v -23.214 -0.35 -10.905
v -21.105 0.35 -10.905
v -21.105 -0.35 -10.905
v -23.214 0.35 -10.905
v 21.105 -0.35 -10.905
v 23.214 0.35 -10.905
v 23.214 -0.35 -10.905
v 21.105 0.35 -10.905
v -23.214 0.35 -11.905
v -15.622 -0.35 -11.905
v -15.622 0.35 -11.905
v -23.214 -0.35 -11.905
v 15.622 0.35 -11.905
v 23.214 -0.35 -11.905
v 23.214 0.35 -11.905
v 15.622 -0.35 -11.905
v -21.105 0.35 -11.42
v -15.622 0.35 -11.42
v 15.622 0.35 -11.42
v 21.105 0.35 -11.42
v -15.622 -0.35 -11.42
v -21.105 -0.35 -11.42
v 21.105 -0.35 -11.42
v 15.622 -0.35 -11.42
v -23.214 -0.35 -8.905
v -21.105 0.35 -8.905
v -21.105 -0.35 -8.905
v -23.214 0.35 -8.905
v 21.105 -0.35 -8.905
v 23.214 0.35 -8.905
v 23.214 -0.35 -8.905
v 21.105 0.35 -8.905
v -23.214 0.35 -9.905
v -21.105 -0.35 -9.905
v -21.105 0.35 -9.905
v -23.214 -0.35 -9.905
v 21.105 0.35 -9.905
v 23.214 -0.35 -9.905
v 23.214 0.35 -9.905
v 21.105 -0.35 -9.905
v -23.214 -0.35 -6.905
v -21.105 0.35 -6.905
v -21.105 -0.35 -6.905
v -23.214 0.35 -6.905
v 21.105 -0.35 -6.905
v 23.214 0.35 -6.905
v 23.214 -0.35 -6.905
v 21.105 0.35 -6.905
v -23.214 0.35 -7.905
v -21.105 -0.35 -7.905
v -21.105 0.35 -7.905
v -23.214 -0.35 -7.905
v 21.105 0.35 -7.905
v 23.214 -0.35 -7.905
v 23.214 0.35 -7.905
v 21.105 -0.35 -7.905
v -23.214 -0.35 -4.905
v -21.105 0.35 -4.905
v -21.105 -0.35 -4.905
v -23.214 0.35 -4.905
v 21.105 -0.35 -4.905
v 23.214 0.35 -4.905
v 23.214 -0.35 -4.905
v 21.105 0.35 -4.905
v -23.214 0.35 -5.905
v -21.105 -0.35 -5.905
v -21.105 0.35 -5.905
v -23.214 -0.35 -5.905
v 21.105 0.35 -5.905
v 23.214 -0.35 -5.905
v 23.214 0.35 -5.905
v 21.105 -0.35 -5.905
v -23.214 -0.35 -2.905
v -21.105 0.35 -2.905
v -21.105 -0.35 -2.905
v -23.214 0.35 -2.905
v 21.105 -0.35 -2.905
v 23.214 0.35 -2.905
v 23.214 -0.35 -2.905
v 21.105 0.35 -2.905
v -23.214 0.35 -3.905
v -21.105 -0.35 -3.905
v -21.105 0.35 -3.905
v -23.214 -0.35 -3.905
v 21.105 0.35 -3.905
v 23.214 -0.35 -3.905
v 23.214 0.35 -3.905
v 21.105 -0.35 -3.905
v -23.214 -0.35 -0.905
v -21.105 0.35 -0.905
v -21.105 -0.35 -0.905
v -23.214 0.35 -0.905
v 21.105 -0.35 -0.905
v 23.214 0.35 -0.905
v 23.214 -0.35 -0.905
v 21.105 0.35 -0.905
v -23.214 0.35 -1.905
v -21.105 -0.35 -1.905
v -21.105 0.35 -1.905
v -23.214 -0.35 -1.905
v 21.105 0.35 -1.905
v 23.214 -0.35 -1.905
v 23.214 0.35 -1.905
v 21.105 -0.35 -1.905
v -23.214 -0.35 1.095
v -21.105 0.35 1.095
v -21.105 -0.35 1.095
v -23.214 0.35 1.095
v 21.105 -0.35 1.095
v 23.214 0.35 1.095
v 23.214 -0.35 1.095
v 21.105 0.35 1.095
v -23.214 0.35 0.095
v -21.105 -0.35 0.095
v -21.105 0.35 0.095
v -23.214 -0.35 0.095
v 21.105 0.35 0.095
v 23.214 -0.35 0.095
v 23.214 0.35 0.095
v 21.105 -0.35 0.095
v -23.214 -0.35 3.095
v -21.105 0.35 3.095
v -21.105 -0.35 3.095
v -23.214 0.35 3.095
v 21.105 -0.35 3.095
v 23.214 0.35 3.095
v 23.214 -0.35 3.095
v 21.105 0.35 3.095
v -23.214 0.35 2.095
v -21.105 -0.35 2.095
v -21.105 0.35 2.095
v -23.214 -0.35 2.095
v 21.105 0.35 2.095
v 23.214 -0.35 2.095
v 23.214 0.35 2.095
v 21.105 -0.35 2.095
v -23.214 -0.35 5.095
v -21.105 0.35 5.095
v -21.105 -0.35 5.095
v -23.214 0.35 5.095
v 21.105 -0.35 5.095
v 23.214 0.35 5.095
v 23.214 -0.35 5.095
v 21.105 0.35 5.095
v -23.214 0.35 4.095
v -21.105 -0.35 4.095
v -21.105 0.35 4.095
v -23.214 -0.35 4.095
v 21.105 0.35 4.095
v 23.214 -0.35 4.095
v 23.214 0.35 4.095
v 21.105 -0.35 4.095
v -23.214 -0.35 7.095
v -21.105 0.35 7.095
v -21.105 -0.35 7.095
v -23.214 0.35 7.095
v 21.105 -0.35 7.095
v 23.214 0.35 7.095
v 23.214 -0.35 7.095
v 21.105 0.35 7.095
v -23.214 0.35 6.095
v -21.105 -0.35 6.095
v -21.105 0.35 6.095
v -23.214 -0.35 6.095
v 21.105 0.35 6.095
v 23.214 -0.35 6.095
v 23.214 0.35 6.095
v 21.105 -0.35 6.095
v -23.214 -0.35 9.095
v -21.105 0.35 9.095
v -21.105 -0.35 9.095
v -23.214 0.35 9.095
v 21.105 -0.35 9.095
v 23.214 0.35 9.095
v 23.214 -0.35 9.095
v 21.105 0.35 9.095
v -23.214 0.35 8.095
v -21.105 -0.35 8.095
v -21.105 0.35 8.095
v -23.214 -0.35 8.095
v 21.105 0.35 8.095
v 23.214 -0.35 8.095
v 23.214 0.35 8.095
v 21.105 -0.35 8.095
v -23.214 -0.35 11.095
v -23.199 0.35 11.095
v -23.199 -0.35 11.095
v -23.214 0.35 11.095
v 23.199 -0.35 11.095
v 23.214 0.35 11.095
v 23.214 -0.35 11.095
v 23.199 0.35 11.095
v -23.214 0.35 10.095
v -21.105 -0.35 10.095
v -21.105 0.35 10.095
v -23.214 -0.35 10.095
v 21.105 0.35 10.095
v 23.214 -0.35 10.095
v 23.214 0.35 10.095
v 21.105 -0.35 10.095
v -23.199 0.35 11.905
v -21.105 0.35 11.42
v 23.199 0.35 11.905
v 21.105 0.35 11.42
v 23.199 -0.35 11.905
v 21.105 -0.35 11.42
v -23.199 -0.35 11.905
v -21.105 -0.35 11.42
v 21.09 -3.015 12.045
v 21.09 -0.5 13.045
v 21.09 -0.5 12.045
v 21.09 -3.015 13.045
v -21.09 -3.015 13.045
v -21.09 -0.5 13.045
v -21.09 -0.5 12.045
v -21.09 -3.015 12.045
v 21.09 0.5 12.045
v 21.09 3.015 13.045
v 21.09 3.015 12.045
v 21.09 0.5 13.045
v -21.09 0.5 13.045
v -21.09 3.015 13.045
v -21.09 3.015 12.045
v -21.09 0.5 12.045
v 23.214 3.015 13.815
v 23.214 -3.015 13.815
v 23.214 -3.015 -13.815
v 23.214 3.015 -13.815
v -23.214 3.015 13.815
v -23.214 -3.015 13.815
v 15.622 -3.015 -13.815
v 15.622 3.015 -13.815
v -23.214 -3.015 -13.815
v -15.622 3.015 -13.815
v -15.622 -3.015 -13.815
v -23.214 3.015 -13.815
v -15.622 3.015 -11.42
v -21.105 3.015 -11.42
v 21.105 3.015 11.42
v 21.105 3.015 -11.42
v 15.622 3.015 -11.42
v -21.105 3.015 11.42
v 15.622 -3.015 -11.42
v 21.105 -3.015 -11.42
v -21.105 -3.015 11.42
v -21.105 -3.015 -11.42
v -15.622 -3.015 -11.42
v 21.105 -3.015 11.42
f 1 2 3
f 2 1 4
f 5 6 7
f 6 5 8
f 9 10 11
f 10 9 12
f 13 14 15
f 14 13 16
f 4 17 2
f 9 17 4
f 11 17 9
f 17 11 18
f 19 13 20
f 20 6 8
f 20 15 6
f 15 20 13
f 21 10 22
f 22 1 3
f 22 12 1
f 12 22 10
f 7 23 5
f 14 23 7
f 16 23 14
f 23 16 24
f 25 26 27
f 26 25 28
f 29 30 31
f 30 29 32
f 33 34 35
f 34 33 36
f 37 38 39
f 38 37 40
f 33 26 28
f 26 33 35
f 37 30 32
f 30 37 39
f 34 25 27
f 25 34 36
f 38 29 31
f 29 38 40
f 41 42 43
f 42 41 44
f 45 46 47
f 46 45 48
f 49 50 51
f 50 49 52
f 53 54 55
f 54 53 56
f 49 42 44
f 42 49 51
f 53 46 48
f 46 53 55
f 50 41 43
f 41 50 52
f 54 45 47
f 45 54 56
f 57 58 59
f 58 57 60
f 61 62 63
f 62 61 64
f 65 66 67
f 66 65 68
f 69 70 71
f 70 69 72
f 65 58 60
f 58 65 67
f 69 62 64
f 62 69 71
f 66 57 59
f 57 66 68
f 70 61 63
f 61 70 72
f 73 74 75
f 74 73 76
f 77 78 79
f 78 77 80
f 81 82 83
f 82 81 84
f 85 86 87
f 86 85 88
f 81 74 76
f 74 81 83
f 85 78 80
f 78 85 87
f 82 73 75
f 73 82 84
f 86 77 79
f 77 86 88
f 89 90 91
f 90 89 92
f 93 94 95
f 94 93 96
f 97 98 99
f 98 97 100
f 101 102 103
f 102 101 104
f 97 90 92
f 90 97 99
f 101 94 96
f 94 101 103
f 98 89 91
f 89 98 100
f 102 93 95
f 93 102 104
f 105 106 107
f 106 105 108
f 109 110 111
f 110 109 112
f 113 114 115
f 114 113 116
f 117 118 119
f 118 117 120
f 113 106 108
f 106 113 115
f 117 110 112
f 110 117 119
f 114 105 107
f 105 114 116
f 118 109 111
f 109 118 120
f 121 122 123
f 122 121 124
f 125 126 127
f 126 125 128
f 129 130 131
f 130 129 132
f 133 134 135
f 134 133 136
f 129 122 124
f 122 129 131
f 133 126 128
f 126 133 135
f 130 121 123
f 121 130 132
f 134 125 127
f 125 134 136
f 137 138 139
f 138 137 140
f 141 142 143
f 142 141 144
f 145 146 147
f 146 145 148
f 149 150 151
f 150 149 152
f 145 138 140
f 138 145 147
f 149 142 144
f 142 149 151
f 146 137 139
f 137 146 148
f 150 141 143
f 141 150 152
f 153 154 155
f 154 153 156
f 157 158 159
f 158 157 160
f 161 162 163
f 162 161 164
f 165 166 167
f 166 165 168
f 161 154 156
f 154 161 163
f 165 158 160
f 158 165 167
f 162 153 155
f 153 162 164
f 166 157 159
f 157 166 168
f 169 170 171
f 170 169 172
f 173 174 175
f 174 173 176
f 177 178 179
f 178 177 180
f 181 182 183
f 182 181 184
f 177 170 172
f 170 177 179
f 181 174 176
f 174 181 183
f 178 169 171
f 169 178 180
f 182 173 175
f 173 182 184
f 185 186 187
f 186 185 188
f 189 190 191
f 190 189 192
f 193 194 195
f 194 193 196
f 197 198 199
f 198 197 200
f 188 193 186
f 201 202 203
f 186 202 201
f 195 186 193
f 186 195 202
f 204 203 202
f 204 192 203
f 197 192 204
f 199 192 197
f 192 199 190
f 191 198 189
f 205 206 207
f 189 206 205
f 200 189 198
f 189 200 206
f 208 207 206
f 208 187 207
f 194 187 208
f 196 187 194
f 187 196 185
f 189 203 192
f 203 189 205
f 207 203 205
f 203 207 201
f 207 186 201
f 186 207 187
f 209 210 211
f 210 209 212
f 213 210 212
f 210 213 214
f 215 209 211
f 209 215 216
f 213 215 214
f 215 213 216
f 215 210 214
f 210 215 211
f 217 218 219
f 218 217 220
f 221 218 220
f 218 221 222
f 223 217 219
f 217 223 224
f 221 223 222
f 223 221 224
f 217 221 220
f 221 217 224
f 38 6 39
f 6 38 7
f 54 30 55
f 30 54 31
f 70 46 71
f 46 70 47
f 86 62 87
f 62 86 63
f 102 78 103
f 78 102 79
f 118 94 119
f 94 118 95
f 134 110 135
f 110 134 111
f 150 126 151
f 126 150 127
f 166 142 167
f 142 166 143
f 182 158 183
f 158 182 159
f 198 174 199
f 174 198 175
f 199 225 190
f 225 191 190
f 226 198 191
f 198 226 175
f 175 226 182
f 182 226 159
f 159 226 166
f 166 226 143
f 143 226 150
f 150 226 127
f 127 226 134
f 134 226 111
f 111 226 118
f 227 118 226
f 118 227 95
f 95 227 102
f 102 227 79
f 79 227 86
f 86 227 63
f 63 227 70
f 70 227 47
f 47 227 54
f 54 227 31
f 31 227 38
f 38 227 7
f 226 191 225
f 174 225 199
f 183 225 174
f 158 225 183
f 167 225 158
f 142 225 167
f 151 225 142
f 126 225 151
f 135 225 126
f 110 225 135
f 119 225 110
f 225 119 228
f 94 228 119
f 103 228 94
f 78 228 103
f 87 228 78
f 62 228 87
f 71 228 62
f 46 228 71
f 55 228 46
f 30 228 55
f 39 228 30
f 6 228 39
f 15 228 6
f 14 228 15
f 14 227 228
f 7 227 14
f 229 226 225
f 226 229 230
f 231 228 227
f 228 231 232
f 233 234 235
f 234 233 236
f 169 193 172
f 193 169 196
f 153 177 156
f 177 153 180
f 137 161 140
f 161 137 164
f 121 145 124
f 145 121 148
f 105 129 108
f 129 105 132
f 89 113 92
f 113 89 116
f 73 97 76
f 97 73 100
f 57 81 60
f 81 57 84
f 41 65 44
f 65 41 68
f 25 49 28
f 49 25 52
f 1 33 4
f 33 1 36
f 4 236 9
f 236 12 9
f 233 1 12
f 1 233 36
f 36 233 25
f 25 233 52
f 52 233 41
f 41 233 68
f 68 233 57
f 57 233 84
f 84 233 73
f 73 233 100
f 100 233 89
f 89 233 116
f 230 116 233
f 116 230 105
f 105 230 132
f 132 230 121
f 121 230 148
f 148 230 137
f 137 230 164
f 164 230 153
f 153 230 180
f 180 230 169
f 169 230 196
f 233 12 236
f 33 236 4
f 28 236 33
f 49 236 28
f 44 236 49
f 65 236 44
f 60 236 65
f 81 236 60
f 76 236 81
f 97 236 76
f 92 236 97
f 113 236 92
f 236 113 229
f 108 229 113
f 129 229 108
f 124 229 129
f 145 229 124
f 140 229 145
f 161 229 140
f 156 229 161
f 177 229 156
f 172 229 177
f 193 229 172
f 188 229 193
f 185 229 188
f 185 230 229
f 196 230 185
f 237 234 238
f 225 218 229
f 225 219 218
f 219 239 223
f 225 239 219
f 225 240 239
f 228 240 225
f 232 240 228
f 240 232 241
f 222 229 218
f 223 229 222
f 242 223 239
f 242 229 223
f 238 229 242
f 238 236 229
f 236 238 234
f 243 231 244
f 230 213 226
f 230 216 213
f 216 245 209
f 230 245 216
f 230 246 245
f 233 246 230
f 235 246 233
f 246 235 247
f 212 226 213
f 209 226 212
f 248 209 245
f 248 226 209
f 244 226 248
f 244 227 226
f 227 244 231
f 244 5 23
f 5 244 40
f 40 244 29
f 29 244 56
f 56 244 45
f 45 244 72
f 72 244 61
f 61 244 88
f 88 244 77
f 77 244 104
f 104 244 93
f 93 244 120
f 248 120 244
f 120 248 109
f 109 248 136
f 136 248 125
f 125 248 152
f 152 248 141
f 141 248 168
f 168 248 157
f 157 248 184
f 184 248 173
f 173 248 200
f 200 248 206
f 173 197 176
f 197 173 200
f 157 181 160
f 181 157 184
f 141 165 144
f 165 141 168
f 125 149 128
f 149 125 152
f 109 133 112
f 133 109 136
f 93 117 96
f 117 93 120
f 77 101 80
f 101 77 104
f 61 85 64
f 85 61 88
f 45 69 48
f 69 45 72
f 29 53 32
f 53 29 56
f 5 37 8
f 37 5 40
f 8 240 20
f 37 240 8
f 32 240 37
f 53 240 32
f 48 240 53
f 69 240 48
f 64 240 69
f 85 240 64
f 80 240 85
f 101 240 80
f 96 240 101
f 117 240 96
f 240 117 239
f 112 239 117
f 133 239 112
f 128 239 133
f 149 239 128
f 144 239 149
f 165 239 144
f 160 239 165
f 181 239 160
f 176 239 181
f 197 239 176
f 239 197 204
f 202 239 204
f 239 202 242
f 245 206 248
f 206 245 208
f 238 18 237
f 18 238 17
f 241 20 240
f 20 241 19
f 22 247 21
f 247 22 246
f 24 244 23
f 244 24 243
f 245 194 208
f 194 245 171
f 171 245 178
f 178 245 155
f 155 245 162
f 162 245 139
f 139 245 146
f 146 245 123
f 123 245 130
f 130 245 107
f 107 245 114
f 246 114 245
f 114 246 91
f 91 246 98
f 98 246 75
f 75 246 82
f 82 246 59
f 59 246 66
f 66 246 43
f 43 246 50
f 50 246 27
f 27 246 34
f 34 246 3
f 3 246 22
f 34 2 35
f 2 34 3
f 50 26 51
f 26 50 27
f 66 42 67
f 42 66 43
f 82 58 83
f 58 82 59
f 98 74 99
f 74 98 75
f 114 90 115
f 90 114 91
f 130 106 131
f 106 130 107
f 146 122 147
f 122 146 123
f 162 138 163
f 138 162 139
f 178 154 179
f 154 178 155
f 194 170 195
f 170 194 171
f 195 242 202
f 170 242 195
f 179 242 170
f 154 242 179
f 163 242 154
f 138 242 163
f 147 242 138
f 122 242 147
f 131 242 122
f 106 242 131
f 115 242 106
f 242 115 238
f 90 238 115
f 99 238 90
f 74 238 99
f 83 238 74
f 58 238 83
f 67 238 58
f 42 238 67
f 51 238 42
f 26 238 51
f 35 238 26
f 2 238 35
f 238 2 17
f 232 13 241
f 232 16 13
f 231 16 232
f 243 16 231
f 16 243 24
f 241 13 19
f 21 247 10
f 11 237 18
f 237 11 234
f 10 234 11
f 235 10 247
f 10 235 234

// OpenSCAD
// file: MakerBotSettings.scad
// Printer settings
extruder_width = 0.4;
global_correction = 0.04 + 2*extruder_width;
// main file
include <MakerBotSettings.scad>
printer_error = .03;

motor_width  = 42.18;
motor_depth  = 13.90;
motor_height = 22.81;

casing_scale  = 1.1;
casing_width  = casing_scale * motor_width;
casing_height = casing_scale * casing_scale * motor_height;
casing_depth  = 6;


MotorCase(error=printer_error);
//Motor();

module MotorCase(error=0) {

	difference() {
		cube( [casing_width+error, casing_depth+error, casing_height+error ], center=true );
		Motor(error=error);
		translate( [0,0,-1*casing_height/2] )
		Motor(error=error,size=.74);	
        Cutout();
		
	}



}

module Cutout(error=0) {
	translate( [0,0, motor_height/2] )
		cube([ casing_width,.7, 1], center=true );

		translate( [0,casing_depth/-2, (casing_height/casing_scale)/2] )
		cube([ motor_width,5, 1], center=true );

		translate( [0,casing_depth/2, (casing_height/casing_scale)/2] )
		cube([ motor_width,5, 1], center=true );
		
		// Side decals
      for(i = [motor_height/-2 : 2 : motor_height/2 ])
		translate([0,0,i])
		cube([ casing_width*2+error, .7, 1 ],center=true );
}

module Motor(error=0,size=1) {
    cube( [size*motor_width+error, size*motor_depth+error, size*motor_height+error ], center=true );
}
